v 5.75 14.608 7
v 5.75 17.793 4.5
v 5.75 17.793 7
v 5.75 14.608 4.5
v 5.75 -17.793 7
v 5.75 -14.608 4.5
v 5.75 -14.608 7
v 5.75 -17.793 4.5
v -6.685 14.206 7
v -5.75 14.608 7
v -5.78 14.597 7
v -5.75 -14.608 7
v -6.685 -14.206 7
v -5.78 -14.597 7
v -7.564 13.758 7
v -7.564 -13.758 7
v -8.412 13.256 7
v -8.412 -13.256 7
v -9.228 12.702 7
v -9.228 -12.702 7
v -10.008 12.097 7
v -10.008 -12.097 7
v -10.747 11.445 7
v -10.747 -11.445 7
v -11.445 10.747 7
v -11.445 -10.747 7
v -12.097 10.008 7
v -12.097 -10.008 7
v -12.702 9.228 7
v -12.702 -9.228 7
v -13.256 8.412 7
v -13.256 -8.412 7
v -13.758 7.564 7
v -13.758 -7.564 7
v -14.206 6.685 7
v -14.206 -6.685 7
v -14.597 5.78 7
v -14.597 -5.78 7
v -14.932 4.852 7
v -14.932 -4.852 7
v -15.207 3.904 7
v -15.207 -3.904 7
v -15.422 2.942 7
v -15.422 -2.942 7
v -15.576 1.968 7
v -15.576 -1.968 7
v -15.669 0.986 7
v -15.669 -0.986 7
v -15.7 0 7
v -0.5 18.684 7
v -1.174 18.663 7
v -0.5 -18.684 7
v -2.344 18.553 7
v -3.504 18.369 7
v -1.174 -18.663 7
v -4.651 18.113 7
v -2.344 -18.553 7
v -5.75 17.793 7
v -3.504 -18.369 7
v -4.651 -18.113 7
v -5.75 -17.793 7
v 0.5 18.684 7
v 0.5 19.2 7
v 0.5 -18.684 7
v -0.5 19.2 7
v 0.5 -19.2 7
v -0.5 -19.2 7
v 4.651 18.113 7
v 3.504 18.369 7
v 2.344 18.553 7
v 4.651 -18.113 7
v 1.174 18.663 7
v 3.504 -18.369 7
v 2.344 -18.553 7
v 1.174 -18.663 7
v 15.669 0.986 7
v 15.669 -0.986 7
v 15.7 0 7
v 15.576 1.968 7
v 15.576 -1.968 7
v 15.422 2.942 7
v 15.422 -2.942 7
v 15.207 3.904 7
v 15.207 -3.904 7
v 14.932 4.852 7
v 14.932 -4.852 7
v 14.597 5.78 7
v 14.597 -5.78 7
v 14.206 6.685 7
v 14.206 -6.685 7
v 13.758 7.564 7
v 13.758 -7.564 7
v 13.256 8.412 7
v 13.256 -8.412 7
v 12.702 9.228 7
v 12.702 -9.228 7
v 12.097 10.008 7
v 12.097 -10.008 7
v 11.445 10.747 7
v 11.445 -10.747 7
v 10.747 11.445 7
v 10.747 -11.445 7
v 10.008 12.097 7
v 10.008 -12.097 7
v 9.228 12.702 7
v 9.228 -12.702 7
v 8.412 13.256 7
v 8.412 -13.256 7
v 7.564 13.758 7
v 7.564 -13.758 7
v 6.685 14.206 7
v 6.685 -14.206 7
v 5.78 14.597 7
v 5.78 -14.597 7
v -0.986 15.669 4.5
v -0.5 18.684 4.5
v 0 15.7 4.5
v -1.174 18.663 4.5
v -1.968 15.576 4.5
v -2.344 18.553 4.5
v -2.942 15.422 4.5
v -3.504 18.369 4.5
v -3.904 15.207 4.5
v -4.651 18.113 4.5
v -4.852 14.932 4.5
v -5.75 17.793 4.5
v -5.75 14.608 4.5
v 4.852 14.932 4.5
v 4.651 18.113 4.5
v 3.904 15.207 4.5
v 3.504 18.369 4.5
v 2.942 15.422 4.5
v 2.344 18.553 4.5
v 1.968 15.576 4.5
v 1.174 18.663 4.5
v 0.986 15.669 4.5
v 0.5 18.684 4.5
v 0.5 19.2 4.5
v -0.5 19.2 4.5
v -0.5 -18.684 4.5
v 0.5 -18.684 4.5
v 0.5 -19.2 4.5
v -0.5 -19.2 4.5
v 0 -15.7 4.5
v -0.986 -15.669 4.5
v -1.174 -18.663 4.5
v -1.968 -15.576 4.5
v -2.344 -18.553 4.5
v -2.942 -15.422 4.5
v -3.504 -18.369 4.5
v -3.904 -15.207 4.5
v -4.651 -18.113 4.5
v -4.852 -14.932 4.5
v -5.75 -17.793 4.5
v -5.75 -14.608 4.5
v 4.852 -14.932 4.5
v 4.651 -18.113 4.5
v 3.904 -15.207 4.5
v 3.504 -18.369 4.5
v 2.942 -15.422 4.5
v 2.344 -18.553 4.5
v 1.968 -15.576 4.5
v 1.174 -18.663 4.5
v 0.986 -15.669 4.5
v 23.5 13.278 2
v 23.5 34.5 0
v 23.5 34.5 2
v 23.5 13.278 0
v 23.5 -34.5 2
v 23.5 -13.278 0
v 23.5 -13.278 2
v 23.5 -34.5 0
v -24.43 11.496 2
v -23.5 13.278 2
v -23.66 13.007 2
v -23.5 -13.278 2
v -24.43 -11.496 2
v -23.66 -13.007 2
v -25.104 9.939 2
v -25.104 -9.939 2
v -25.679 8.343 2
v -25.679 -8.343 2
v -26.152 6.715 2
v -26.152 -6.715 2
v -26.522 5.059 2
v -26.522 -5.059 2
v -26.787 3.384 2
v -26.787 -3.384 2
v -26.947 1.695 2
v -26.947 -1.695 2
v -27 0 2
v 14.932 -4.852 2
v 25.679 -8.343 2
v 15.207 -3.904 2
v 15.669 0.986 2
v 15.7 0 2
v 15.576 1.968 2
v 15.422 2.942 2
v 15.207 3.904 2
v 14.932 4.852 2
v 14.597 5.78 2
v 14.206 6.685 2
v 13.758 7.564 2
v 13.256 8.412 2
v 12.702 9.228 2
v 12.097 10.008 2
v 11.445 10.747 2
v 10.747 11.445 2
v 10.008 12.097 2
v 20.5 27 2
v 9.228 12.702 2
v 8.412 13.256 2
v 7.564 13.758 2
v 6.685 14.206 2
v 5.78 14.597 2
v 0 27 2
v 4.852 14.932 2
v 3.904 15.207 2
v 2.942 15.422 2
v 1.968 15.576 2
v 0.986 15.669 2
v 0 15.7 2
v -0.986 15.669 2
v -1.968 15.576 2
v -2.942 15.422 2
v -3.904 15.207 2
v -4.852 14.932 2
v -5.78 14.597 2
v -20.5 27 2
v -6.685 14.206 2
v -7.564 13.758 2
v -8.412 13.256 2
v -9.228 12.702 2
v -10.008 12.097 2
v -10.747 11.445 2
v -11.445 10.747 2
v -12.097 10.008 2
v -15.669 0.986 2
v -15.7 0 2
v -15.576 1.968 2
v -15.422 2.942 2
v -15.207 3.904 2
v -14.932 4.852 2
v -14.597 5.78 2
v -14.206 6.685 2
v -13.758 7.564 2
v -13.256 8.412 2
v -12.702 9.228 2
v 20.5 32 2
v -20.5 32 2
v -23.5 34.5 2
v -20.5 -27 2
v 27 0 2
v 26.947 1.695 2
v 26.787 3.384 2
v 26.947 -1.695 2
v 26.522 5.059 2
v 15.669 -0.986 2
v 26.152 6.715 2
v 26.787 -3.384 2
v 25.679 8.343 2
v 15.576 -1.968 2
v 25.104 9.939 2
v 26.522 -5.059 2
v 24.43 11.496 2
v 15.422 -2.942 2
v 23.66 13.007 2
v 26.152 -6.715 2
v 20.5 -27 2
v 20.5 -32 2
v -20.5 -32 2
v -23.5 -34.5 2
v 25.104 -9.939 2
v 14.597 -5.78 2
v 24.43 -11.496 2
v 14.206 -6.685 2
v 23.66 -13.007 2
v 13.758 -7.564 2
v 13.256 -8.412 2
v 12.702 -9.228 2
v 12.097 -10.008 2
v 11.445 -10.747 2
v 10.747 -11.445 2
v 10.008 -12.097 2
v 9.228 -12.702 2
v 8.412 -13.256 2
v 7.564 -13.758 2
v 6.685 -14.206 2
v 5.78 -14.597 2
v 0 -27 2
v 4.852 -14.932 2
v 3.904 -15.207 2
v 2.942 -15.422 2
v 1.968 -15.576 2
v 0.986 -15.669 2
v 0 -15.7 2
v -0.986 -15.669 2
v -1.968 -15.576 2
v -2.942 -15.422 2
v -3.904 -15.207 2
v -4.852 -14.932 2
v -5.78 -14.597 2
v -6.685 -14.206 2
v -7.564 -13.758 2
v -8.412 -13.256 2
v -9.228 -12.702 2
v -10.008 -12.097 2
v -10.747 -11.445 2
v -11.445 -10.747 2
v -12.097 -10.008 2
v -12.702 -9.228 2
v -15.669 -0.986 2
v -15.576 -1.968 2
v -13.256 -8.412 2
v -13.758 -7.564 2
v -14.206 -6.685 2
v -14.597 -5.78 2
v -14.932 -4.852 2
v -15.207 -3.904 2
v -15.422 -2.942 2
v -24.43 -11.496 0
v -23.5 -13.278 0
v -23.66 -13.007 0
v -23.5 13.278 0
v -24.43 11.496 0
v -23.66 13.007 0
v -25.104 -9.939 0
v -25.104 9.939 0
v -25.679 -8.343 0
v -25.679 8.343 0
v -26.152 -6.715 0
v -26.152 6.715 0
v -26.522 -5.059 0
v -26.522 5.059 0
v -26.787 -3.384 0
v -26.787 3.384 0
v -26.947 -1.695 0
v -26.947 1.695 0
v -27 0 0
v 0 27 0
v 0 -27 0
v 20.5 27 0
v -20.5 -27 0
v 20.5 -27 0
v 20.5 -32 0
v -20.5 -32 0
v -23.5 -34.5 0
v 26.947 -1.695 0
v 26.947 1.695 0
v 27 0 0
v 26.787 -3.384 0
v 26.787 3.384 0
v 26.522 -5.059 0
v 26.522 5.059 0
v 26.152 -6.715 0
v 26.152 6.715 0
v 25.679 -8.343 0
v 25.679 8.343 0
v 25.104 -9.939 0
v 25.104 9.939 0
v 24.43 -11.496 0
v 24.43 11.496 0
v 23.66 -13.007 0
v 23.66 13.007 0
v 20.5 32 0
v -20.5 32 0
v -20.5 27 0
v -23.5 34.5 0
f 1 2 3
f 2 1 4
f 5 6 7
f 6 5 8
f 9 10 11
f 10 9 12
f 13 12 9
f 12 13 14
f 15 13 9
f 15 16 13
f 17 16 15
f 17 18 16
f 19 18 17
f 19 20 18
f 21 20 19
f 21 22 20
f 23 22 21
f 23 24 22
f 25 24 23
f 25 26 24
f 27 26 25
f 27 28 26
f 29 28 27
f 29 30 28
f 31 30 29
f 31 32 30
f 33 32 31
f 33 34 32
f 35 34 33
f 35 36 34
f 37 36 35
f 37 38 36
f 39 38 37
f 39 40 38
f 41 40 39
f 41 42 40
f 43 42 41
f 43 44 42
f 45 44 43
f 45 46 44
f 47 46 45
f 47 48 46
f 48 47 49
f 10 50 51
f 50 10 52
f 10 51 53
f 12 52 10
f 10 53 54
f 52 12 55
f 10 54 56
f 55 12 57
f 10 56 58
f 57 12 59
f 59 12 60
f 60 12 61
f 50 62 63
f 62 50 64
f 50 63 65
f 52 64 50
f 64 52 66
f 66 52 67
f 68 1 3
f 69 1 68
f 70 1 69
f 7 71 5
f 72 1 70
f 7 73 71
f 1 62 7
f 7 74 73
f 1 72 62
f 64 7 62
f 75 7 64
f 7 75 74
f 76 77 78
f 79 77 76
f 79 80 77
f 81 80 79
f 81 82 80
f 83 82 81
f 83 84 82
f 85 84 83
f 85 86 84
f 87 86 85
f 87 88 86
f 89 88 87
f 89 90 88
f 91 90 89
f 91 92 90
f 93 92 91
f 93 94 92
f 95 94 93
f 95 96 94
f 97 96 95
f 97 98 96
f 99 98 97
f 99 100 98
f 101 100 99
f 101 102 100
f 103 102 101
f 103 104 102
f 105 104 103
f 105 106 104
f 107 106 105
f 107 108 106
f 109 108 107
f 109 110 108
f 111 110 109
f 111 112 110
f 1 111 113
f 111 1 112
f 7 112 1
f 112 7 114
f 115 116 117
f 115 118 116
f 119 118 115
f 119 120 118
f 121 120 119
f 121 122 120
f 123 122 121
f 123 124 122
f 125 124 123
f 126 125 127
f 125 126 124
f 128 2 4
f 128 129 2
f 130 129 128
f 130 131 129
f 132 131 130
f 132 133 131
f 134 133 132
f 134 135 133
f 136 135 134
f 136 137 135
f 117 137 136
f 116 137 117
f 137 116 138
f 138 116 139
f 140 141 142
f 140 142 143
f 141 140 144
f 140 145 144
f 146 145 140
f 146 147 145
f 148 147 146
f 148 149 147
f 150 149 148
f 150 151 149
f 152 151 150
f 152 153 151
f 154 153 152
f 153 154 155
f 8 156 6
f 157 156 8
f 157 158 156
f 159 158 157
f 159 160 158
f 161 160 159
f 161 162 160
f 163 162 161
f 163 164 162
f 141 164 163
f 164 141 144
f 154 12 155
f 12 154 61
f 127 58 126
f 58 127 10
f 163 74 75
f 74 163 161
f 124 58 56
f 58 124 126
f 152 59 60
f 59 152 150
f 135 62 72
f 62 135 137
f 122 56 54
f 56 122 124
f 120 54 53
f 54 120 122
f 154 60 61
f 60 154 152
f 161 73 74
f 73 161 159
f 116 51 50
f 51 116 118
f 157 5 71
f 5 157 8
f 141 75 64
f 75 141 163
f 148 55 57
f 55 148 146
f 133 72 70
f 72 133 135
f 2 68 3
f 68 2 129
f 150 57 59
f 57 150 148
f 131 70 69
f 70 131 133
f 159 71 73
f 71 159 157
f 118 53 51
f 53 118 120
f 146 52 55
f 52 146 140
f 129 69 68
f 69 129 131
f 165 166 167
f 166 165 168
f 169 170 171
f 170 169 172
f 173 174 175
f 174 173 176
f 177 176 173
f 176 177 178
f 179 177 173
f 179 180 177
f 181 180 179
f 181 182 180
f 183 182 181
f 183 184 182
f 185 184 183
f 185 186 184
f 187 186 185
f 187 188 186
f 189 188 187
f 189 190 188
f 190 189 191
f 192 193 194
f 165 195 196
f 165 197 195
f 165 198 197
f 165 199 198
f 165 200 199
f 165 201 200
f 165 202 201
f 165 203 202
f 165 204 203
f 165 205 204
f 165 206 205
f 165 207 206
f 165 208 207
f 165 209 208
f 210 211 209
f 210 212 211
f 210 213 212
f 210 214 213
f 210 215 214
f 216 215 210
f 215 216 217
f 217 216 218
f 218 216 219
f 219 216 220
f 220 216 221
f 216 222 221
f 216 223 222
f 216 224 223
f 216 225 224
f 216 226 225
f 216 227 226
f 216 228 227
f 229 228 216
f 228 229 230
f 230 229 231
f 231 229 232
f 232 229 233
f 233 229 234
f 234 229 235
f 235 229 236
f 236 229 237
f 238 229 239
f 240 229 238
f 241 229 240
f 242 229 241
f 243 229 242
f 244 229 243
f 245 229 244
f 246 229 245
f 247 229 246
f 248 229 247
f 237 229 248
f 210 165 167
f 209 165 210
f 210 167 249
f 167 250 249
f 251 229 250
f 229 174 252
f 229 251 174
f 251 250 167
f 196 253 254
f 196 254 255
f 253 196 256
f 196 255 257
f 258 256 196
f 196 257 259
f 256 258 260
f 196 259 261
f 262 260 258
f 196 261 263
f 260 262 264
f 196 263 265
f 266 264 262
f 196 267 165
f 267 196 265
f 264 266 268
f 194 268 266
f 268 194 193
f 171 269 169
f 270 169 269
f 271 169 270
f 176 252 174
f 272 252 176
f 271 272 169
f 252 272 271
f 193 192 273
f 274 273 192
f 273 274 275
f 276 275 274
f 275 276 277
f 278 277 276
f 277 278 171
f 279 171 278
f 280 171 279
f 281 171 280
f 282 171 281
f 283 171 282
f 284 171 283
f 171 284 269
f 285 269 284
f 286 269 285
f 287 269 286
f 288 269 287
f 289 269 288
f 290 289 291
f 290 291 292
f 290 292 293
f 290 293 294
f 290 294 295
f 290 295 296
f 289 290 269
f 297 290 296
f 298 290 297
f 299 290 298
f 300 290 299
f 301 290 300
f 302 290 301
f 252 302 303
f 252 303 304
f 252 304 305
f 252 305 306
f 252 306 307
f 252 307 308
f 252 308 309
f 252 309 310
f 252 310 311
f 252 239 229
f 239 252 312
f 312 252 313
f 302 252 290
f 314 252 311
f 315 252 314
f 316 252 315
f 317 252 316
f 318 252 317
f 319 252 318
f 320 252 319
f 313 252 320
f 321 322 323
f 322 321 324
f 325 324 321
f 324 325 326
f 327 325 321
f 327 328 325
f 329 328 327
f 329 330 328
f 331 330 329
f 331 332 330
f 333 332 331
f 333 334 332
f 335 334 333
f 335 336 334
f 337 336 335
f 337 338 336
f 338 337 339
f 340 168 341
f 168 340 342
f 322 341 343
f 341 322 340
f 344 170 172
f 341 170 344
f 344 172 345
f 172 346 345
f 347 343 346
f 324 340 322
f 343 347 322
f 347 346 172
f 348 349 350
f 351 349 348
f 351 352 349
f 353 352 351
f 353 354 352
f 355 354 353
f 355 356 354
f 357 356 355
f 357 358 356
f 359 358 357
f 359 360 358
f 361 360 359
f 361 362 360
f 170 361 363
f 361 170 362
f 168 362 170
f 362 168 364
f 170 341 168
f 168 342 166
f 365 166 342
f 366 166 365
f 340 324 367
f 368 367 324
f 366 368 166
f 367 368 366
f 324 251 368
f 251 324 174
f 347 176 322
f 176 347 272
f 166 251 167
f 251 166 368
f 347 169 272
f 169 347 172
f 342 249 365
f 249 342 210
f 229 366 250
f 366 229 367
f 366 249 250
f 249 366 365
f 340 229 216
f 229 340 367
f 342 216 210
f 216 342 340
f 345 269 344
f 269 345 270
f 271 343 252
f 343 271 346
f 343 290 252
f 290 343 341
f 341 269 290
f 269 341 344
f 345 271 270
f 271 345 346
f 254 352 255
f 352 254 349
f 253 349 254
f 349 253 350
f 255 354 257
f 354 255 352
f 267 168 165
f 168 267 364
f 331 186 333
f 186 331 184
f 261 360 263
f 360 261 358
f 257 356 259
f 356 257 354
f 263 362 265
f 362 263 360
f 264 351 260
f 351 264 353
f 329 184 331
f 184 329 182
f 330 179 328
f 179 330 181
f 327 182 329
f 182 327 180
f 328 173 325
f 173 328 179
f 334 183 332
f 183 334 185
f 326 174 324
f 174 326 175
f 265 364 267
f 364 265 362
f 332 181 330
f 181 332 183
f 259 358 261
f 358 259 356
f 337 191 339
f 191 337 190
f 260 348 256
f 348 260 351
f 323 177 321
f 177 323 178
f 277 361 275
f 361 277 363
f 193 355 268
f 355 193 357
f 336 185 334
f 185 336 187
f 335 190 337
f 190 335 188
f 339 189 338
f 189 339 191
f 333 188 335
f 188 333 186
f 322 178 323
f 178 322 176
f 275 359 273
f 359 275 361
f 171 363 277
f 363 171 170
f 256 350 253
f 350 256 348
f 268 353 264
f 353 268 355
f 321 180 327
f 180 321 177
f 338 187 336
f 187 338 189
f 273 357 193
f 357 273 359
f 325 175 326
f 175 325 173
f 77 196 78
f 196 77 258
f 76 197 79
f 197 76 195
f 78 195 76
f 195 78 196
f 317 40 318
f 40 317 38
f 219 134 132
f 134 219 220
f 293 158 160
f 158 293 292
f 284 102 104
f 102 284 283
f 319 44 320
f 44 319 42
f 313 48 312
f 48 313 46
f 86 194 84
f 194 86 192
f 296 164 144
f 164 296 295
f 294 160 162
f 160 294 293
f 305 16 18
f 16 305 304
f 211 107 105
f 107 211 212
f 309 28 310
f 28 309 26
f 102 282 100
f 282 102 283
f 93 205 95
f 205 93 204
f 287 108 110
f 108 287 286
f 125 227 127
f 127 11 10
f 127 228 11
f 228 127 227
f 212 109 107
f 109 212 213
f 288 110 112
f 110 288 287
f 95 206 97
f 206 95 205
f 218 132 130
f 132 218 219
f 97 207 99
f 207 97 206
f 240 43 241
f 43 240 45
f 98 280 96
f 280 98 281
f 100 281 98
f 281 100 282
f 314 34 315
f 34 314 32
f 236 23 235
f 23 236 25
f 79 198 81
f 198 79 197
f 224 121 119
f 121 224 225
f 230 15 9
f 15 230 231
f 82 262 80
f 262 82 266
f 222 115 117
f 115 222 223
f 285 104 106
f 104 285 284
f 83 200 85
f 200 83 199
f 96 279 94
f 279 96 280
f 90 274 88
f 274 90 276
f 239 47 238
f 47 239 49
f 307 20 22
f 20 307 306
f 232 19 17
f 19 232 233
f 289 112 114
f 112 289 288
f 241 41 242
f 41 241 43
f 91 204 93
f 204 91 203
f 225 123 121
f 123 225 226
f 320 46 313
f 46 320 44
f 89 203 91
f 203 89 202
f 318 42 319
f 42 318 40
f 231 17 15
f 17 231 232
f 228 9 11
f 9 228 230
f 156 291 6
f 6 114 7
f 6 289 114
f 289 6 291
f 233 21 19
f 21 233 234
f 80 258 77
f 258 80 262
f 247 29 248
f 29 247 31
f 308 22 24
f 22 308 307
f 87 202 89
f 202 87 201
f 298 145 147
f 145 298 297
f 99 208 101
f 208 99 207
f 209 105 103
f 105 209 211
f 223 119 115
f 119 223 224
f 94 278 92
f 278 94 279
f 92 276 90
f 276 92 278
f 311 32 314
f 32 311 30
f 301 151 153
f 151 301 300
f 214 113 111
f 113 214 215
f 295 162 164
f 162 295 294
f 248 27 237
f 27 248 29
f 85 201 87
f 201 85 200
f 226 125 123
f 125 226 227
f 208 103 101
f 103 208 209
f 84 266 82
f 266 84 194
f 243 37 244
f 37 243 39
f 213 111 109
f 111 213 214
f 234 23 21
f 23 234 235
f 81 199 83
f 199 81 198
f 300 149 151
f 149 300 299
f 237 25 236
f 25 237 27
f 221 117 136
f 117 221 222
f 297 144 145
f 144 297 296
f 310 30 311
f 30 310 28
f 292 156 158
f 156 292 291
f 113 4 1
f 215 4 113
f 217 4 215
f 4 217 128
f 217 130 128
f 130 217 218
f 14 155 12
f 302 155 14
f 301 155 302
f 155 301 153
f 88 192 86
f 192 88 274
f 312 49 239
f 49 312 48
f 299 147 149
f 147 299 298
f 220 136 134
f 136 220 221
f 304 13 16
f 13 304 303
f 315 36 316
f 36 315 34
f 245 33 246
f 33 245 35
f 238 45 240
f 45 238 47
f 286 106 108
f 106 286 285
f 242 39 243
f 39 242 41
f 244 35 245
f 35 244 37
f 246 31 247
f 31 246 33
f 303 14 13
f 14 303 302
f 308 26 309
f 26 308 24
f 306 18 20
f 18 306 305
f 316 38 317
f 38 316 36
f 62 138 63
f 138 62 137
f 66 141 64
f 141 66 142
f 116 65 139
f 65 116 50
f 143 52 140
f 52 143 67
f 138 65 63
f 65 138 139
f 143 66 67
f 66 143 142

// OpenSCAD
$fn=100;
brad=54/2;
trad=31.4/2;
gap=2.5;

cylinder(r=brad,h=2);
cylinder(r=trad,h=2+gap+2.5);
intersection(){
   translate([0,0,2+gap+1.25]) cube([11.5,trad*2+6,2.5], center=true);
   cylinder(r=trad+3,h=2+gap+2.5);
}
   translate([0,0,2+gap+1.25]) cube([1,trad*2+6+1,2.5], center=true);

difference() {
translate([0,0,1]) cube([47,brad*2+15,2], center=true);
translate([-20.5,brad,-1]) cube([41,5,4]);
translate([-20.5,-brad-5,-1]) cube([41,5,4]);
}
